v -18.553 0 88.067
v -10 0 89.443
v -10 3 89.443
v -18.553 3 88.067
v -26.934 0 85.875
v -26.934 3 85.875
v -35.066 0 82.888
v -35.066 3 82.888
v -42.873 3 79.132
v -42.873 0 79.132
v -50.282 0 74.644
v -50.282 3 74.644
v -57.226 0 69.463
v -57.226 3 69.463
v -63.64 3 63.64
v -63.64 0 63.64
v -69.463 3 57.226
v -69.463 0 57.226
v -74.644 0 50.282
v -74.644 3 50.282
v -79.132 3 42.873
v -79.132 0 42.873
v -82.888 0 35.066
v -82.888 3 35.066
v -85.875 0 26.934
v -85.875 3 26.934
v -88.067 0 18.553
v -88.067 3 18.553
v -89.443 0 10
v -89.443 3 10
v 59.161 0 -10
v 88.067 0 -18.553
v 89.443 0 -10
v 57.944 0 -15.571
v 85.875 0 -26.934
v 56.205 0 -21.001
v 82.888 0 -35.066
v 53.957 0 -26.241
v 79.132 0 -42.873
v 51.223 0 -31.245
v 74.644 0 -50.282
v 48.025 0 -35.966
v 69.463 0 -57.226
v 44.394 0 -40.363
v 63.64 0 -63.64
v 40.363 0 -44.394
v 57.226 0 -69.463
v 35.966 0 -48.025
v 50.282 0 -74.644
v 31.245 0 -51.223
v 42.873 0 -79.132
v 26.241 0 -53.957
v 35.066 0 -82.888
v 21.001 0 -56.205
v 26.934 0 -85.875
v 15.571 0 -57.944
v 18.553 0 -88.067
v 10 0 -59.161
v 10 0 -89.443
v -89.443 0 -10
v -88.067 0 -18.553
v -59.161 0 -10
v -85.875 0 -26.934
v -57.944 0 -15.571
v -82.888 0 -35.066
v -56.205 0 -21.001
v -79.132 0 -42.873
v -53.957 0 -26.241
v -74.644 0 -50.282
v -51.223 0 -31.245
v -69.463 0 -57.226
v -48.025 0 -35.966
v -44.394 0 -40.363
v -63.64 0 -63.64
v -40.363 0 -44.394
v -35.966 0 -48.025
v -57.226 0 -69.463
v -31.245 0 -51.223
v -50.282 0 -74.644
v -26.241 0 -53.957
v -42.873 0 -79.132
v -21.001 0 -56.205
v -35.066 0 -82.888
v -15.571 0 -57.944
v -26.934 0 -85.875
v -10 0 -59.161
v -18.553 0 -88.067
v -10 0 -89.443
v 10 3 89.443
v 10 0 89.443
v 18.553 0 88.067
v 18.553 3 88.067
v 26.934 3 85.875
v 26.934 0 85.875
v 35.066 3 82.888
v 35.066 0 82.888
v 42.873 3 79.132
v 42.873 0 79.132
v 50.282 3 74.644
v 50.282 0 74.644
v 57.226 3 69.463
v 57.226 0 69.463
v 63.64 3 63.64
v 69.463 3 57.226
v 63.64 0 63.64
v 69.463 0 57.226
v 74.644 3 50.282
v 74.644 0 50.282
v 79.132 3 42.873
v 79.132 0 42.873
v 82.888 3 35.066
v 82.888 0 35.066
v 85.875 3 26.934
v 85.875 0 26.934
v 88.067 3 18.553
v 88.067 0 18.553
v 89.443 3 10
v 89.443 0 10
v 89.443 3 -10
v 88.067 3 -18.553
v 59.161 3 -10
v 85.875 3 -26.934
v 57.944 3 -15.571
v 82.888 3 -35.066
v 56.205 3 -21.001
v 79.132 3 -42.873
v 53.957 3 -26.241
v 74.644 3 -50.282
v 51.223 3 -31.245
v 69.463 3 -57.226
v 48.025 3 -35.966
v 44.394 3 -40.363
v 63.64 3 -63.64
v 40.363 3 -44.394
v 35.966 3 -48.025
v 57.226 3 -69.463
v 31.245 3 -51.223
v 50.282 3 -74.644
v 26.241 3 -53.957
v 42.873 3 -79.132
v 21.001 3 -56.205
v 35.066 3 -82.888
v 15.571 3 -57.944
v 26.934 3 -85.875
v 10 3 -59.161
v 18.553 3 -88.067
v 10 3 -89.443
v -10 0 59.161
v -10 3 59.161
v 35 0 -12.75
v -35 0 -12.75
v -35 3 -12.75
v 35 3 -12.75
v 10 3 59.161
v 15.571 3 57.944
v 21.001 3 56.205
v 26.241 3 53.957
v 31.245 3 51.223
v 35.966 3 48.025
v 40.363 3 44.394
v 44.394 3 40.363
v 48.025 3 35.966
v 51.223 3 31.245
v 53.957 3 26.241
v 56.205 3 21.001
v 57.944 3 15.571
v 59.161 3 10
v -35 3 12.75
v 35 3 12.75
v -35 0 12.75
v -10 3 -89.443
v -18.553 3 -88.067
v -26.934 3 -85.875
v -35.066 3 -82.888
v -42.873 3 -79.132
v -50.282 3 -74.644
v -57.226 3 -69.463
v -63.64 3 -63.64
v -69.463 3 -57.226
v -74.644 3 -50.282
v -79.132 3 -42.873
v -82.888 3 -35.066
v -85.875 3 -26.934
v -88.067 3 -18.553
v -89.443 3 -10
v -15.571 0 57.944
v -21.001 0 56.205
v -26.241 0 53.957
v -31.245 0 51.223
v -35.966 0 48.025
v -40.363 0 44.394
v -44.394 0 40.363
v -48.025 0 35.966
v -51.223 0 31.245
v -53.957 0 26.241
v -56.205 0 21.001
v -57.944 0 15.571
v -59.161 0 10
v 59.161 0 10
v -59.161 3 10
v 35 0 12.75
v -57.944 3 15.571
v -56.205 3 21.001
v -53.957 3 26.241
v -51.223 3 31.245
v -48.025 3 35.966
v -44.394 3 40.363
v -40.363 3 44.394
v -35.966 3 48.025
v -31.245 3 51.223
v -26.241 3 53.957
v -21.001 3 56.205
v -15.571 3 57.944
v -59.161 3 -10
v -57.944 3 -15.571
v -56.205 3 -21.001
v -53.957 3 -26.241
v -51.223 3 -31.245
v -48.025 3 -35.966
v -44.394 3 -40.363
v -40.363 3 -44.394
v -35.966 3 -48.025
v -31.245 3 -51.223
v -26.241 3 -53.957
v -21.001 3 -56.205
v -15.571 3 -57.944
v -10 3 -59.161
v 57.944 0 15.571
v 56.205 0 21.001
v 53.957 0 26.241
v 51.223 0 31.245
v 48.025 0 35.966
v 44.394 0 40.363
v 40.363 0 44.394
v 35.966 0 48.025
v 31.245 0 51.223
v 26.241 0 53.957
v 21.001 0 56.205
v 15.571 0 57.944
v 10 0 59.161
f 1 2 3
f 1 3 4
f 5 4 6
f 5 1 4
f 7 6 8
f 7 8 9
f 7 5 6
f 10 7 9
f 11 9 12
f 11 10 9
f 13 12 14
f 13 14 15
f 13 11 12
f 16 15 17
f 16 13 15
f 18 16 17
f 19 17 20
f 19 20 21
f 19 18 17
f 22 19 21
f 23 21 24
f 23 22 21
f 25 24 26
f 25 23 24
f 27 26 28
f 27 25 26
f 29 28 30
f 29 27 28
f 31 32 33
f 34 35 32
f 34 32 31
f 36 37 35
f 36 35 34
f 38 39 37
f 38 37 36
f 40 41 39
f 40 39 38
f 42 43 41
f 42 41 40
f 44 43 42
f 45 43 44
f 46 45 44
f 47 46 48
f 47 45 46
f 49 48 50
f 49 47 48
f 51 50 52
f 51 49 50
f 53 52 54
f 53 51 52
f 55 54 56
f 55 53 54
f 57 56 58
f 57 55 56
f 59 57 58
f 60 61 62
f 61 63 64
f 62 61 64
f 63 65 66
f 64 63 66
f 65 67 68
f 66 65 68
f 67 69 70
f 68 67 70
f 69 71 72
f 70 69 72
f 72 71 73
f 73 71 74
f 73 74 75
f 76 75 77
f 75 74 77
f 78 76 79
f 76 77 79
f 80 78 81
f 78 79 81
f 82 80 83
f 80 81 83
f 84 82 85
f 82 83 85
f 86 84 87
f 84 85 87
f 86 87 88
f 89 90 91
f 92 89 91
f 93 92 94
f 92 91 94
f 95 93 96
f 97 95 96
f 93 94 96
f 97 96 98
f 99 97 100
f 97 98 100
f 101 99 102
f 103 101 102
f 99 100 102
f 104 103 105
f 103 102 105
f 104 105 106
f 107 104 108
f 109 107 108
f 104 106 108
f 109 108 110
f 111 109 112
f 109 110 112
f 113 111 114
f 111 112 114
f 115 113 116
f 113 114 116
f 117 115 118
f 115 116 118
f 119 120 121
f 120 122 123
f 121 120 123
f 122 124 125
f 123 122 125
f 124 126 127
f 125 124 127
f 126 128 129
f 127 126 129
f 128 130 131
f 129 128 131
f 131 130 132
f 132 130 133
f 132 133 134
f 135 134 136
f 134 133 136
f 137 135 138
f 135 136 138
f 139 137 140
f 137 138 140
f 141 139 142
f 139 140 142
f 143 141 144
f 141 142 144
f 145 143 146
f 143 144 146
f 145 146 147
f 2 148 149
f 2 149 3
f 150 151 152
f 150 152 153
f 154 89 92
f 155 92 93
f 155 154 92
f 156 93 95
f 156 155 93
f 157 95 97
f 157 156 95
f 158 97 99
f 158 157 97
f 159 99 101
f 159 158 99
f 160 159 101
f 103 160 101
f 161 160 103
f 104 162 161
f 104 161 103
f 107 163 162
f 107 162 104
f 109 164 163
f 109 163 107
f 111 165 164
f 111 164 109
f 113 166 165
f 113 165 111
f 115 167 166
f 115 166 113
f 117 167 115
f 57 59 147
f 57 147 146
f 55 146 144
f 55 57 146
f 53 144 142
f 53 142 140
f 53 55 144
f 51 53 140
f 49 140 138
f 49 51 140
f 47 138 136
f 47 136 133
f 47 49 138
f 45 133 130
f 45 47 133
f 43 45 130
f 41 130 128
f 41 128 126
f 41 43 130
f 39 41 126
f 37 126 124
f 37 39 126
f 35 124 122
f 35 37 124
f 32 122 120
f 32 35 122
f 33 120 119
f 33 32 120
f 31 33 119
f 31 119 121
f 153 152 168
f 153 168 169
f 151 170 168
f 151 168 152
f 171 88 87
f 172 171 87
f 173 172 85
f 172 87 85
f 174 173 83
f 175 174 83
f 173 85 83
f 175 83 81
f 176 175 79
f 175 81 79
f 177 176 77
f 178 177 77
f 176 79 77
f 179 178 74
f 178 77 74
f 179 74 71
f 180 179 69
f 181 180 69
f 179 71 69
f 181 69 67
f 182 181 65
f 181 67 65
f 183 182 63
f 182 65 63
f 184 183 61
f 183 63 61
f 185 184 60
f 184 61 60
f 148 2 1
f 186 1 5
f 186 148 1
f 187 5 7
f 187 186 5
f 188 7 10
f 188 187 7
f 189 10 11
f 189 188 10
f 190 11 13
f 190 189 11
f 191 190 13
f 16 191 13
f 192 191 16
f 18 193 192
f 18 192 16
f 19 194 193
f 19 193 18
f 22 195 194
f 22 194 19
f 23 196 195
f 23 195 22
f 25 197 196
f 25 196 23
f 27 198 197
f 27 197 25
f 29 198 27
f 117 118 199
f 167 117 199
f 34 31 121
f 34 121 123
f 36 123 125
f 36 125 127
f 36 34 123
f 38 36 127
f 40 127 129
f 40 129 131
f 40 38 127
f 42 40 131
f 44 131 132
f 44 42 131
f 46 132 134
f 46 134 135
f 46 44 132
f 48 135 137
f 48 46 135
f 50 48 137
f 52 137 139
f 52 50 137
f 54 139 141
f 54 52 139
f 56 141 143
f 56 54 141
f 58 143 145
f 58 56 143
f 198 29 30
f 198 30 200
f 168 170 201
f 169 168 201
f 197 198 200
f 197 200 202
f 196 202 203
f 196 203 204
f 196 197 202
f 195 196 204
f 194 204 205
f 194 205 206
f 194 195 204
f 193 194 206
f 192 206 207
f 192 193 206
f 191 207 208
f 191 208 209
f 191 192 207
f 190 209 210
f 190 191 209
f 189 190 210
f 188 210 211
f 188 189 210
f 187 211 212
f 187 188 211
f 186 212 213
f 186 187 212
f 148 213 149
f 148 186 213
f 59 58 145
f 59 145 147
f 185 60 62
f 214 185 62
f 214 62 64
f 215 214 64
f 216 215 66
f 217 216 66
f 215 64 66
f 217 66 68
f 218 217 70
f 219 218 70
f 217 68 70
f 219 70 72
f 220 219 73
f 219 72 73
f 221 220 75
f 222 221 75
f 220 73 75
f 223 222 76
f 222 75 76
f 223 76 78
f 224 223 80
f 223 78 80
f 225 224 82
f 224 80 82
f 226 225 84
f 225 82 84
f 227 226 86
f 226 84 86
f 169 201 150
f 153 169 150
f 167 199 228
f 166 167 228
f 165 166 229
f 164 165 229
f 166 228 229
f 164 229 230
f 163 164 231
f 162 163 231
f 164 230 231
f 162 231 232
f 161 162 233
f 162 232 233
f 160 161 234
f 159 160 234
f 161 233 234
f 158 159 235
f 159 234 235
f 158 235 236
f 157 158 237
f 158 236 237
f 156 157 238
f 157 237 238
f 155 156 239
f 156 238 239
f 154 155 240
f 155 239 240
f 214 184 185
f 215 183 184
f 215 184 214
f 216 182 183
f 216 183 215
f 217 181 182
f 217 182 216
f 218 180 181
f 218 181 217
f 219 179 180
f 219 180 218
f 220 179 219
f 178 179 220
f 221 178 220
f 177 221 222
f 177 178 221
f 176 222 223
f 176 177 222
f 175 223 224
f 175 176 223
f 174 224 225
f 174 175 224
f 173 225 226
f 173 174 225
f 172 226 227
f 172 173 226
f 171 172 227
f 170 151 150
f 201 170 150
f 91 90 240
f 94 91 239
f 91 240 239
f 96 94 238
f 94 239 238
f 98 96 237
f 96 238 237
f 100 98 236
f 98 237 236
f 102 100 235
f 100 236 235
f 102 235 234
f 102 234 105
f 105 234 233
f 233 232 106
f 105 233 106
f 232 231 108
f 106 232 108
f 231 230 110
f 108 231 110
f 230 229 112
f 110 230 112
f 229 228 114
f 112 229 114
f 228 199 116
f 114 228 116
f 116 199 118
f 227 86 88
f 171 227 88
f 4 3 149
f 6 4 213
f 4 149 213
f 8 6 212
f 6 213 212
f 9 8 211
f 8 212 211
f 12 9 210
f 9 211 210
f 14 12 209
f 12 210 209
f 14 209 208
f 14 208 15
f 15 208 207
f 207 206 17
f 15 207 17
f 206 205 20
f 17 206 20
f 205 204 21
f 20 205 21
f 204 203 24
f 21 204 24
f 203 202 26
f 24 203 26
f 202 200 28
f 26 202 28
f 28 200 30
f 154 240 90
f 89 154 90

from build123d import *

# Parameters (mm, degrees)
BOSS_EXTRUDE1_DEPTH   = 3
BOSS_EXTRUDE1_2_DEPTH = 3
BOSS_EXTRUDE1_3_DEPTH = 3
BOSS_EXTRUDE1_4_DEPTH = 3
SKETCH1_W             = 70
SKETCH1_H             = 25.5
BOSS_EXTRUDE1_5_DEPTH = 3


with BuildPart() as part:
    # Sketch1 → Boss-Extrude1 (new body)
    with BuildSketch(Plane(origin=(0, 0, 0), x_dir=(1, 0, 0), z_dir=(0, 1, 0))):
        with BuildLine():
            Line((-10, 59.160797831), (-10, 89.4427191))
            ThreePointArc((-10, 89.4427191), (-63.639610307, 63.639610307), (-89.4427191, 10))
            Line((-89.4427191, 10), (-59.160797831, 10))
            ThreePointArc((-59.160797831, 10), (-42.426406871, 42.426406871), (-10, 59.160797831))
        make_face()
    extrude(amount=BOSS_EXTRUDE1_DEPTH)


with BuildPart() as body_2:
    # Sketch1 → Boss-Extrude1 2 (new body)
    with BuildSketch(Plane(origin=(0, 0, 0), x_dir=(1, 0, 0), z_dir=(0, 1, 0))):
        with BuildLine():
            Line((10, 59.160797831), (10, 89.4427191))
            ThreePointArc((10, 89.4427191), (63.639610307, 63.639610307), (89.4427191, 10))
            Line((89.4427191, 10), (59.160797831, 10))
            ThreePointArc((59.160797831, 10), (42.426406871, 42.426406871), (10, 59.160797831))
        make_face()
    extrude(amount=BOSS_EXTRUDE1_2_DEPTH)


with BuildPart() as body_3:
    # Sketch1 → Boss-Extrude1 3 (new body)
    with BuildSketch(Plane(origin=(0, 0, 0), x_dir=(1, 0, 0), z_dir=(0, 1, 0))):
        with BuildLine():
            Line((10, -59.160797831), (10, -89.4427191))
            ThreePointArc((10, -89.4427191), (63.639610307, -63.639610307), (89.4427191, -10))
            Line((89.4427191, -10), (59.160797831, -10))
            ThreePointArc((59.160797831, -10), (42.426406871, -42.426406871), (10, -59.160797831))
        make_face()
    extrude(amount=BOSS_EXTRUDE1_3_DEPTH)


with BuildPart() as body_4:
    # Sketch1 → Boss-Extrude1 4 (new body)
    with BuildSketch(Plane(origin=(0, 0, 0), x_dir=(1, 0, 0), z_dir=(0, 1, 0))):
        with BuildLine():
            Line((-10, -59.160797831), (-10, -89.4427191))
            ThreePointArc((-10, -89.4427191), (-63.639610307, -63.639610307), (-89.4427191, -10))
            Line((-89.4427191, -10), (-59.160797831, -10))
            ThreePointArc((-59.160797831, -10), (-42.426406871, -42.426406871), (-10, -59.160797831))
        make_face()
    extrude(amount=BOSS_EXTRUDE1_4_DEPTH)


with BuildPart() as body_5:
    # Sketch1 → Boss-Extrude1 5 (new body)
    with BuildSketch(Plane(origin=(0, 0, 0), x_dir=(1, 0, 0), z_dir=(0, 1, 0))):
        Rectangle(SKETCH1_W, SKETCH1_H)
    extrude(amount=BOSS_EXTRUDE1_5_DEPTH)


solid = Compound([part.part, body_2.part, body_3.part, body_4.part, body_5.part])
